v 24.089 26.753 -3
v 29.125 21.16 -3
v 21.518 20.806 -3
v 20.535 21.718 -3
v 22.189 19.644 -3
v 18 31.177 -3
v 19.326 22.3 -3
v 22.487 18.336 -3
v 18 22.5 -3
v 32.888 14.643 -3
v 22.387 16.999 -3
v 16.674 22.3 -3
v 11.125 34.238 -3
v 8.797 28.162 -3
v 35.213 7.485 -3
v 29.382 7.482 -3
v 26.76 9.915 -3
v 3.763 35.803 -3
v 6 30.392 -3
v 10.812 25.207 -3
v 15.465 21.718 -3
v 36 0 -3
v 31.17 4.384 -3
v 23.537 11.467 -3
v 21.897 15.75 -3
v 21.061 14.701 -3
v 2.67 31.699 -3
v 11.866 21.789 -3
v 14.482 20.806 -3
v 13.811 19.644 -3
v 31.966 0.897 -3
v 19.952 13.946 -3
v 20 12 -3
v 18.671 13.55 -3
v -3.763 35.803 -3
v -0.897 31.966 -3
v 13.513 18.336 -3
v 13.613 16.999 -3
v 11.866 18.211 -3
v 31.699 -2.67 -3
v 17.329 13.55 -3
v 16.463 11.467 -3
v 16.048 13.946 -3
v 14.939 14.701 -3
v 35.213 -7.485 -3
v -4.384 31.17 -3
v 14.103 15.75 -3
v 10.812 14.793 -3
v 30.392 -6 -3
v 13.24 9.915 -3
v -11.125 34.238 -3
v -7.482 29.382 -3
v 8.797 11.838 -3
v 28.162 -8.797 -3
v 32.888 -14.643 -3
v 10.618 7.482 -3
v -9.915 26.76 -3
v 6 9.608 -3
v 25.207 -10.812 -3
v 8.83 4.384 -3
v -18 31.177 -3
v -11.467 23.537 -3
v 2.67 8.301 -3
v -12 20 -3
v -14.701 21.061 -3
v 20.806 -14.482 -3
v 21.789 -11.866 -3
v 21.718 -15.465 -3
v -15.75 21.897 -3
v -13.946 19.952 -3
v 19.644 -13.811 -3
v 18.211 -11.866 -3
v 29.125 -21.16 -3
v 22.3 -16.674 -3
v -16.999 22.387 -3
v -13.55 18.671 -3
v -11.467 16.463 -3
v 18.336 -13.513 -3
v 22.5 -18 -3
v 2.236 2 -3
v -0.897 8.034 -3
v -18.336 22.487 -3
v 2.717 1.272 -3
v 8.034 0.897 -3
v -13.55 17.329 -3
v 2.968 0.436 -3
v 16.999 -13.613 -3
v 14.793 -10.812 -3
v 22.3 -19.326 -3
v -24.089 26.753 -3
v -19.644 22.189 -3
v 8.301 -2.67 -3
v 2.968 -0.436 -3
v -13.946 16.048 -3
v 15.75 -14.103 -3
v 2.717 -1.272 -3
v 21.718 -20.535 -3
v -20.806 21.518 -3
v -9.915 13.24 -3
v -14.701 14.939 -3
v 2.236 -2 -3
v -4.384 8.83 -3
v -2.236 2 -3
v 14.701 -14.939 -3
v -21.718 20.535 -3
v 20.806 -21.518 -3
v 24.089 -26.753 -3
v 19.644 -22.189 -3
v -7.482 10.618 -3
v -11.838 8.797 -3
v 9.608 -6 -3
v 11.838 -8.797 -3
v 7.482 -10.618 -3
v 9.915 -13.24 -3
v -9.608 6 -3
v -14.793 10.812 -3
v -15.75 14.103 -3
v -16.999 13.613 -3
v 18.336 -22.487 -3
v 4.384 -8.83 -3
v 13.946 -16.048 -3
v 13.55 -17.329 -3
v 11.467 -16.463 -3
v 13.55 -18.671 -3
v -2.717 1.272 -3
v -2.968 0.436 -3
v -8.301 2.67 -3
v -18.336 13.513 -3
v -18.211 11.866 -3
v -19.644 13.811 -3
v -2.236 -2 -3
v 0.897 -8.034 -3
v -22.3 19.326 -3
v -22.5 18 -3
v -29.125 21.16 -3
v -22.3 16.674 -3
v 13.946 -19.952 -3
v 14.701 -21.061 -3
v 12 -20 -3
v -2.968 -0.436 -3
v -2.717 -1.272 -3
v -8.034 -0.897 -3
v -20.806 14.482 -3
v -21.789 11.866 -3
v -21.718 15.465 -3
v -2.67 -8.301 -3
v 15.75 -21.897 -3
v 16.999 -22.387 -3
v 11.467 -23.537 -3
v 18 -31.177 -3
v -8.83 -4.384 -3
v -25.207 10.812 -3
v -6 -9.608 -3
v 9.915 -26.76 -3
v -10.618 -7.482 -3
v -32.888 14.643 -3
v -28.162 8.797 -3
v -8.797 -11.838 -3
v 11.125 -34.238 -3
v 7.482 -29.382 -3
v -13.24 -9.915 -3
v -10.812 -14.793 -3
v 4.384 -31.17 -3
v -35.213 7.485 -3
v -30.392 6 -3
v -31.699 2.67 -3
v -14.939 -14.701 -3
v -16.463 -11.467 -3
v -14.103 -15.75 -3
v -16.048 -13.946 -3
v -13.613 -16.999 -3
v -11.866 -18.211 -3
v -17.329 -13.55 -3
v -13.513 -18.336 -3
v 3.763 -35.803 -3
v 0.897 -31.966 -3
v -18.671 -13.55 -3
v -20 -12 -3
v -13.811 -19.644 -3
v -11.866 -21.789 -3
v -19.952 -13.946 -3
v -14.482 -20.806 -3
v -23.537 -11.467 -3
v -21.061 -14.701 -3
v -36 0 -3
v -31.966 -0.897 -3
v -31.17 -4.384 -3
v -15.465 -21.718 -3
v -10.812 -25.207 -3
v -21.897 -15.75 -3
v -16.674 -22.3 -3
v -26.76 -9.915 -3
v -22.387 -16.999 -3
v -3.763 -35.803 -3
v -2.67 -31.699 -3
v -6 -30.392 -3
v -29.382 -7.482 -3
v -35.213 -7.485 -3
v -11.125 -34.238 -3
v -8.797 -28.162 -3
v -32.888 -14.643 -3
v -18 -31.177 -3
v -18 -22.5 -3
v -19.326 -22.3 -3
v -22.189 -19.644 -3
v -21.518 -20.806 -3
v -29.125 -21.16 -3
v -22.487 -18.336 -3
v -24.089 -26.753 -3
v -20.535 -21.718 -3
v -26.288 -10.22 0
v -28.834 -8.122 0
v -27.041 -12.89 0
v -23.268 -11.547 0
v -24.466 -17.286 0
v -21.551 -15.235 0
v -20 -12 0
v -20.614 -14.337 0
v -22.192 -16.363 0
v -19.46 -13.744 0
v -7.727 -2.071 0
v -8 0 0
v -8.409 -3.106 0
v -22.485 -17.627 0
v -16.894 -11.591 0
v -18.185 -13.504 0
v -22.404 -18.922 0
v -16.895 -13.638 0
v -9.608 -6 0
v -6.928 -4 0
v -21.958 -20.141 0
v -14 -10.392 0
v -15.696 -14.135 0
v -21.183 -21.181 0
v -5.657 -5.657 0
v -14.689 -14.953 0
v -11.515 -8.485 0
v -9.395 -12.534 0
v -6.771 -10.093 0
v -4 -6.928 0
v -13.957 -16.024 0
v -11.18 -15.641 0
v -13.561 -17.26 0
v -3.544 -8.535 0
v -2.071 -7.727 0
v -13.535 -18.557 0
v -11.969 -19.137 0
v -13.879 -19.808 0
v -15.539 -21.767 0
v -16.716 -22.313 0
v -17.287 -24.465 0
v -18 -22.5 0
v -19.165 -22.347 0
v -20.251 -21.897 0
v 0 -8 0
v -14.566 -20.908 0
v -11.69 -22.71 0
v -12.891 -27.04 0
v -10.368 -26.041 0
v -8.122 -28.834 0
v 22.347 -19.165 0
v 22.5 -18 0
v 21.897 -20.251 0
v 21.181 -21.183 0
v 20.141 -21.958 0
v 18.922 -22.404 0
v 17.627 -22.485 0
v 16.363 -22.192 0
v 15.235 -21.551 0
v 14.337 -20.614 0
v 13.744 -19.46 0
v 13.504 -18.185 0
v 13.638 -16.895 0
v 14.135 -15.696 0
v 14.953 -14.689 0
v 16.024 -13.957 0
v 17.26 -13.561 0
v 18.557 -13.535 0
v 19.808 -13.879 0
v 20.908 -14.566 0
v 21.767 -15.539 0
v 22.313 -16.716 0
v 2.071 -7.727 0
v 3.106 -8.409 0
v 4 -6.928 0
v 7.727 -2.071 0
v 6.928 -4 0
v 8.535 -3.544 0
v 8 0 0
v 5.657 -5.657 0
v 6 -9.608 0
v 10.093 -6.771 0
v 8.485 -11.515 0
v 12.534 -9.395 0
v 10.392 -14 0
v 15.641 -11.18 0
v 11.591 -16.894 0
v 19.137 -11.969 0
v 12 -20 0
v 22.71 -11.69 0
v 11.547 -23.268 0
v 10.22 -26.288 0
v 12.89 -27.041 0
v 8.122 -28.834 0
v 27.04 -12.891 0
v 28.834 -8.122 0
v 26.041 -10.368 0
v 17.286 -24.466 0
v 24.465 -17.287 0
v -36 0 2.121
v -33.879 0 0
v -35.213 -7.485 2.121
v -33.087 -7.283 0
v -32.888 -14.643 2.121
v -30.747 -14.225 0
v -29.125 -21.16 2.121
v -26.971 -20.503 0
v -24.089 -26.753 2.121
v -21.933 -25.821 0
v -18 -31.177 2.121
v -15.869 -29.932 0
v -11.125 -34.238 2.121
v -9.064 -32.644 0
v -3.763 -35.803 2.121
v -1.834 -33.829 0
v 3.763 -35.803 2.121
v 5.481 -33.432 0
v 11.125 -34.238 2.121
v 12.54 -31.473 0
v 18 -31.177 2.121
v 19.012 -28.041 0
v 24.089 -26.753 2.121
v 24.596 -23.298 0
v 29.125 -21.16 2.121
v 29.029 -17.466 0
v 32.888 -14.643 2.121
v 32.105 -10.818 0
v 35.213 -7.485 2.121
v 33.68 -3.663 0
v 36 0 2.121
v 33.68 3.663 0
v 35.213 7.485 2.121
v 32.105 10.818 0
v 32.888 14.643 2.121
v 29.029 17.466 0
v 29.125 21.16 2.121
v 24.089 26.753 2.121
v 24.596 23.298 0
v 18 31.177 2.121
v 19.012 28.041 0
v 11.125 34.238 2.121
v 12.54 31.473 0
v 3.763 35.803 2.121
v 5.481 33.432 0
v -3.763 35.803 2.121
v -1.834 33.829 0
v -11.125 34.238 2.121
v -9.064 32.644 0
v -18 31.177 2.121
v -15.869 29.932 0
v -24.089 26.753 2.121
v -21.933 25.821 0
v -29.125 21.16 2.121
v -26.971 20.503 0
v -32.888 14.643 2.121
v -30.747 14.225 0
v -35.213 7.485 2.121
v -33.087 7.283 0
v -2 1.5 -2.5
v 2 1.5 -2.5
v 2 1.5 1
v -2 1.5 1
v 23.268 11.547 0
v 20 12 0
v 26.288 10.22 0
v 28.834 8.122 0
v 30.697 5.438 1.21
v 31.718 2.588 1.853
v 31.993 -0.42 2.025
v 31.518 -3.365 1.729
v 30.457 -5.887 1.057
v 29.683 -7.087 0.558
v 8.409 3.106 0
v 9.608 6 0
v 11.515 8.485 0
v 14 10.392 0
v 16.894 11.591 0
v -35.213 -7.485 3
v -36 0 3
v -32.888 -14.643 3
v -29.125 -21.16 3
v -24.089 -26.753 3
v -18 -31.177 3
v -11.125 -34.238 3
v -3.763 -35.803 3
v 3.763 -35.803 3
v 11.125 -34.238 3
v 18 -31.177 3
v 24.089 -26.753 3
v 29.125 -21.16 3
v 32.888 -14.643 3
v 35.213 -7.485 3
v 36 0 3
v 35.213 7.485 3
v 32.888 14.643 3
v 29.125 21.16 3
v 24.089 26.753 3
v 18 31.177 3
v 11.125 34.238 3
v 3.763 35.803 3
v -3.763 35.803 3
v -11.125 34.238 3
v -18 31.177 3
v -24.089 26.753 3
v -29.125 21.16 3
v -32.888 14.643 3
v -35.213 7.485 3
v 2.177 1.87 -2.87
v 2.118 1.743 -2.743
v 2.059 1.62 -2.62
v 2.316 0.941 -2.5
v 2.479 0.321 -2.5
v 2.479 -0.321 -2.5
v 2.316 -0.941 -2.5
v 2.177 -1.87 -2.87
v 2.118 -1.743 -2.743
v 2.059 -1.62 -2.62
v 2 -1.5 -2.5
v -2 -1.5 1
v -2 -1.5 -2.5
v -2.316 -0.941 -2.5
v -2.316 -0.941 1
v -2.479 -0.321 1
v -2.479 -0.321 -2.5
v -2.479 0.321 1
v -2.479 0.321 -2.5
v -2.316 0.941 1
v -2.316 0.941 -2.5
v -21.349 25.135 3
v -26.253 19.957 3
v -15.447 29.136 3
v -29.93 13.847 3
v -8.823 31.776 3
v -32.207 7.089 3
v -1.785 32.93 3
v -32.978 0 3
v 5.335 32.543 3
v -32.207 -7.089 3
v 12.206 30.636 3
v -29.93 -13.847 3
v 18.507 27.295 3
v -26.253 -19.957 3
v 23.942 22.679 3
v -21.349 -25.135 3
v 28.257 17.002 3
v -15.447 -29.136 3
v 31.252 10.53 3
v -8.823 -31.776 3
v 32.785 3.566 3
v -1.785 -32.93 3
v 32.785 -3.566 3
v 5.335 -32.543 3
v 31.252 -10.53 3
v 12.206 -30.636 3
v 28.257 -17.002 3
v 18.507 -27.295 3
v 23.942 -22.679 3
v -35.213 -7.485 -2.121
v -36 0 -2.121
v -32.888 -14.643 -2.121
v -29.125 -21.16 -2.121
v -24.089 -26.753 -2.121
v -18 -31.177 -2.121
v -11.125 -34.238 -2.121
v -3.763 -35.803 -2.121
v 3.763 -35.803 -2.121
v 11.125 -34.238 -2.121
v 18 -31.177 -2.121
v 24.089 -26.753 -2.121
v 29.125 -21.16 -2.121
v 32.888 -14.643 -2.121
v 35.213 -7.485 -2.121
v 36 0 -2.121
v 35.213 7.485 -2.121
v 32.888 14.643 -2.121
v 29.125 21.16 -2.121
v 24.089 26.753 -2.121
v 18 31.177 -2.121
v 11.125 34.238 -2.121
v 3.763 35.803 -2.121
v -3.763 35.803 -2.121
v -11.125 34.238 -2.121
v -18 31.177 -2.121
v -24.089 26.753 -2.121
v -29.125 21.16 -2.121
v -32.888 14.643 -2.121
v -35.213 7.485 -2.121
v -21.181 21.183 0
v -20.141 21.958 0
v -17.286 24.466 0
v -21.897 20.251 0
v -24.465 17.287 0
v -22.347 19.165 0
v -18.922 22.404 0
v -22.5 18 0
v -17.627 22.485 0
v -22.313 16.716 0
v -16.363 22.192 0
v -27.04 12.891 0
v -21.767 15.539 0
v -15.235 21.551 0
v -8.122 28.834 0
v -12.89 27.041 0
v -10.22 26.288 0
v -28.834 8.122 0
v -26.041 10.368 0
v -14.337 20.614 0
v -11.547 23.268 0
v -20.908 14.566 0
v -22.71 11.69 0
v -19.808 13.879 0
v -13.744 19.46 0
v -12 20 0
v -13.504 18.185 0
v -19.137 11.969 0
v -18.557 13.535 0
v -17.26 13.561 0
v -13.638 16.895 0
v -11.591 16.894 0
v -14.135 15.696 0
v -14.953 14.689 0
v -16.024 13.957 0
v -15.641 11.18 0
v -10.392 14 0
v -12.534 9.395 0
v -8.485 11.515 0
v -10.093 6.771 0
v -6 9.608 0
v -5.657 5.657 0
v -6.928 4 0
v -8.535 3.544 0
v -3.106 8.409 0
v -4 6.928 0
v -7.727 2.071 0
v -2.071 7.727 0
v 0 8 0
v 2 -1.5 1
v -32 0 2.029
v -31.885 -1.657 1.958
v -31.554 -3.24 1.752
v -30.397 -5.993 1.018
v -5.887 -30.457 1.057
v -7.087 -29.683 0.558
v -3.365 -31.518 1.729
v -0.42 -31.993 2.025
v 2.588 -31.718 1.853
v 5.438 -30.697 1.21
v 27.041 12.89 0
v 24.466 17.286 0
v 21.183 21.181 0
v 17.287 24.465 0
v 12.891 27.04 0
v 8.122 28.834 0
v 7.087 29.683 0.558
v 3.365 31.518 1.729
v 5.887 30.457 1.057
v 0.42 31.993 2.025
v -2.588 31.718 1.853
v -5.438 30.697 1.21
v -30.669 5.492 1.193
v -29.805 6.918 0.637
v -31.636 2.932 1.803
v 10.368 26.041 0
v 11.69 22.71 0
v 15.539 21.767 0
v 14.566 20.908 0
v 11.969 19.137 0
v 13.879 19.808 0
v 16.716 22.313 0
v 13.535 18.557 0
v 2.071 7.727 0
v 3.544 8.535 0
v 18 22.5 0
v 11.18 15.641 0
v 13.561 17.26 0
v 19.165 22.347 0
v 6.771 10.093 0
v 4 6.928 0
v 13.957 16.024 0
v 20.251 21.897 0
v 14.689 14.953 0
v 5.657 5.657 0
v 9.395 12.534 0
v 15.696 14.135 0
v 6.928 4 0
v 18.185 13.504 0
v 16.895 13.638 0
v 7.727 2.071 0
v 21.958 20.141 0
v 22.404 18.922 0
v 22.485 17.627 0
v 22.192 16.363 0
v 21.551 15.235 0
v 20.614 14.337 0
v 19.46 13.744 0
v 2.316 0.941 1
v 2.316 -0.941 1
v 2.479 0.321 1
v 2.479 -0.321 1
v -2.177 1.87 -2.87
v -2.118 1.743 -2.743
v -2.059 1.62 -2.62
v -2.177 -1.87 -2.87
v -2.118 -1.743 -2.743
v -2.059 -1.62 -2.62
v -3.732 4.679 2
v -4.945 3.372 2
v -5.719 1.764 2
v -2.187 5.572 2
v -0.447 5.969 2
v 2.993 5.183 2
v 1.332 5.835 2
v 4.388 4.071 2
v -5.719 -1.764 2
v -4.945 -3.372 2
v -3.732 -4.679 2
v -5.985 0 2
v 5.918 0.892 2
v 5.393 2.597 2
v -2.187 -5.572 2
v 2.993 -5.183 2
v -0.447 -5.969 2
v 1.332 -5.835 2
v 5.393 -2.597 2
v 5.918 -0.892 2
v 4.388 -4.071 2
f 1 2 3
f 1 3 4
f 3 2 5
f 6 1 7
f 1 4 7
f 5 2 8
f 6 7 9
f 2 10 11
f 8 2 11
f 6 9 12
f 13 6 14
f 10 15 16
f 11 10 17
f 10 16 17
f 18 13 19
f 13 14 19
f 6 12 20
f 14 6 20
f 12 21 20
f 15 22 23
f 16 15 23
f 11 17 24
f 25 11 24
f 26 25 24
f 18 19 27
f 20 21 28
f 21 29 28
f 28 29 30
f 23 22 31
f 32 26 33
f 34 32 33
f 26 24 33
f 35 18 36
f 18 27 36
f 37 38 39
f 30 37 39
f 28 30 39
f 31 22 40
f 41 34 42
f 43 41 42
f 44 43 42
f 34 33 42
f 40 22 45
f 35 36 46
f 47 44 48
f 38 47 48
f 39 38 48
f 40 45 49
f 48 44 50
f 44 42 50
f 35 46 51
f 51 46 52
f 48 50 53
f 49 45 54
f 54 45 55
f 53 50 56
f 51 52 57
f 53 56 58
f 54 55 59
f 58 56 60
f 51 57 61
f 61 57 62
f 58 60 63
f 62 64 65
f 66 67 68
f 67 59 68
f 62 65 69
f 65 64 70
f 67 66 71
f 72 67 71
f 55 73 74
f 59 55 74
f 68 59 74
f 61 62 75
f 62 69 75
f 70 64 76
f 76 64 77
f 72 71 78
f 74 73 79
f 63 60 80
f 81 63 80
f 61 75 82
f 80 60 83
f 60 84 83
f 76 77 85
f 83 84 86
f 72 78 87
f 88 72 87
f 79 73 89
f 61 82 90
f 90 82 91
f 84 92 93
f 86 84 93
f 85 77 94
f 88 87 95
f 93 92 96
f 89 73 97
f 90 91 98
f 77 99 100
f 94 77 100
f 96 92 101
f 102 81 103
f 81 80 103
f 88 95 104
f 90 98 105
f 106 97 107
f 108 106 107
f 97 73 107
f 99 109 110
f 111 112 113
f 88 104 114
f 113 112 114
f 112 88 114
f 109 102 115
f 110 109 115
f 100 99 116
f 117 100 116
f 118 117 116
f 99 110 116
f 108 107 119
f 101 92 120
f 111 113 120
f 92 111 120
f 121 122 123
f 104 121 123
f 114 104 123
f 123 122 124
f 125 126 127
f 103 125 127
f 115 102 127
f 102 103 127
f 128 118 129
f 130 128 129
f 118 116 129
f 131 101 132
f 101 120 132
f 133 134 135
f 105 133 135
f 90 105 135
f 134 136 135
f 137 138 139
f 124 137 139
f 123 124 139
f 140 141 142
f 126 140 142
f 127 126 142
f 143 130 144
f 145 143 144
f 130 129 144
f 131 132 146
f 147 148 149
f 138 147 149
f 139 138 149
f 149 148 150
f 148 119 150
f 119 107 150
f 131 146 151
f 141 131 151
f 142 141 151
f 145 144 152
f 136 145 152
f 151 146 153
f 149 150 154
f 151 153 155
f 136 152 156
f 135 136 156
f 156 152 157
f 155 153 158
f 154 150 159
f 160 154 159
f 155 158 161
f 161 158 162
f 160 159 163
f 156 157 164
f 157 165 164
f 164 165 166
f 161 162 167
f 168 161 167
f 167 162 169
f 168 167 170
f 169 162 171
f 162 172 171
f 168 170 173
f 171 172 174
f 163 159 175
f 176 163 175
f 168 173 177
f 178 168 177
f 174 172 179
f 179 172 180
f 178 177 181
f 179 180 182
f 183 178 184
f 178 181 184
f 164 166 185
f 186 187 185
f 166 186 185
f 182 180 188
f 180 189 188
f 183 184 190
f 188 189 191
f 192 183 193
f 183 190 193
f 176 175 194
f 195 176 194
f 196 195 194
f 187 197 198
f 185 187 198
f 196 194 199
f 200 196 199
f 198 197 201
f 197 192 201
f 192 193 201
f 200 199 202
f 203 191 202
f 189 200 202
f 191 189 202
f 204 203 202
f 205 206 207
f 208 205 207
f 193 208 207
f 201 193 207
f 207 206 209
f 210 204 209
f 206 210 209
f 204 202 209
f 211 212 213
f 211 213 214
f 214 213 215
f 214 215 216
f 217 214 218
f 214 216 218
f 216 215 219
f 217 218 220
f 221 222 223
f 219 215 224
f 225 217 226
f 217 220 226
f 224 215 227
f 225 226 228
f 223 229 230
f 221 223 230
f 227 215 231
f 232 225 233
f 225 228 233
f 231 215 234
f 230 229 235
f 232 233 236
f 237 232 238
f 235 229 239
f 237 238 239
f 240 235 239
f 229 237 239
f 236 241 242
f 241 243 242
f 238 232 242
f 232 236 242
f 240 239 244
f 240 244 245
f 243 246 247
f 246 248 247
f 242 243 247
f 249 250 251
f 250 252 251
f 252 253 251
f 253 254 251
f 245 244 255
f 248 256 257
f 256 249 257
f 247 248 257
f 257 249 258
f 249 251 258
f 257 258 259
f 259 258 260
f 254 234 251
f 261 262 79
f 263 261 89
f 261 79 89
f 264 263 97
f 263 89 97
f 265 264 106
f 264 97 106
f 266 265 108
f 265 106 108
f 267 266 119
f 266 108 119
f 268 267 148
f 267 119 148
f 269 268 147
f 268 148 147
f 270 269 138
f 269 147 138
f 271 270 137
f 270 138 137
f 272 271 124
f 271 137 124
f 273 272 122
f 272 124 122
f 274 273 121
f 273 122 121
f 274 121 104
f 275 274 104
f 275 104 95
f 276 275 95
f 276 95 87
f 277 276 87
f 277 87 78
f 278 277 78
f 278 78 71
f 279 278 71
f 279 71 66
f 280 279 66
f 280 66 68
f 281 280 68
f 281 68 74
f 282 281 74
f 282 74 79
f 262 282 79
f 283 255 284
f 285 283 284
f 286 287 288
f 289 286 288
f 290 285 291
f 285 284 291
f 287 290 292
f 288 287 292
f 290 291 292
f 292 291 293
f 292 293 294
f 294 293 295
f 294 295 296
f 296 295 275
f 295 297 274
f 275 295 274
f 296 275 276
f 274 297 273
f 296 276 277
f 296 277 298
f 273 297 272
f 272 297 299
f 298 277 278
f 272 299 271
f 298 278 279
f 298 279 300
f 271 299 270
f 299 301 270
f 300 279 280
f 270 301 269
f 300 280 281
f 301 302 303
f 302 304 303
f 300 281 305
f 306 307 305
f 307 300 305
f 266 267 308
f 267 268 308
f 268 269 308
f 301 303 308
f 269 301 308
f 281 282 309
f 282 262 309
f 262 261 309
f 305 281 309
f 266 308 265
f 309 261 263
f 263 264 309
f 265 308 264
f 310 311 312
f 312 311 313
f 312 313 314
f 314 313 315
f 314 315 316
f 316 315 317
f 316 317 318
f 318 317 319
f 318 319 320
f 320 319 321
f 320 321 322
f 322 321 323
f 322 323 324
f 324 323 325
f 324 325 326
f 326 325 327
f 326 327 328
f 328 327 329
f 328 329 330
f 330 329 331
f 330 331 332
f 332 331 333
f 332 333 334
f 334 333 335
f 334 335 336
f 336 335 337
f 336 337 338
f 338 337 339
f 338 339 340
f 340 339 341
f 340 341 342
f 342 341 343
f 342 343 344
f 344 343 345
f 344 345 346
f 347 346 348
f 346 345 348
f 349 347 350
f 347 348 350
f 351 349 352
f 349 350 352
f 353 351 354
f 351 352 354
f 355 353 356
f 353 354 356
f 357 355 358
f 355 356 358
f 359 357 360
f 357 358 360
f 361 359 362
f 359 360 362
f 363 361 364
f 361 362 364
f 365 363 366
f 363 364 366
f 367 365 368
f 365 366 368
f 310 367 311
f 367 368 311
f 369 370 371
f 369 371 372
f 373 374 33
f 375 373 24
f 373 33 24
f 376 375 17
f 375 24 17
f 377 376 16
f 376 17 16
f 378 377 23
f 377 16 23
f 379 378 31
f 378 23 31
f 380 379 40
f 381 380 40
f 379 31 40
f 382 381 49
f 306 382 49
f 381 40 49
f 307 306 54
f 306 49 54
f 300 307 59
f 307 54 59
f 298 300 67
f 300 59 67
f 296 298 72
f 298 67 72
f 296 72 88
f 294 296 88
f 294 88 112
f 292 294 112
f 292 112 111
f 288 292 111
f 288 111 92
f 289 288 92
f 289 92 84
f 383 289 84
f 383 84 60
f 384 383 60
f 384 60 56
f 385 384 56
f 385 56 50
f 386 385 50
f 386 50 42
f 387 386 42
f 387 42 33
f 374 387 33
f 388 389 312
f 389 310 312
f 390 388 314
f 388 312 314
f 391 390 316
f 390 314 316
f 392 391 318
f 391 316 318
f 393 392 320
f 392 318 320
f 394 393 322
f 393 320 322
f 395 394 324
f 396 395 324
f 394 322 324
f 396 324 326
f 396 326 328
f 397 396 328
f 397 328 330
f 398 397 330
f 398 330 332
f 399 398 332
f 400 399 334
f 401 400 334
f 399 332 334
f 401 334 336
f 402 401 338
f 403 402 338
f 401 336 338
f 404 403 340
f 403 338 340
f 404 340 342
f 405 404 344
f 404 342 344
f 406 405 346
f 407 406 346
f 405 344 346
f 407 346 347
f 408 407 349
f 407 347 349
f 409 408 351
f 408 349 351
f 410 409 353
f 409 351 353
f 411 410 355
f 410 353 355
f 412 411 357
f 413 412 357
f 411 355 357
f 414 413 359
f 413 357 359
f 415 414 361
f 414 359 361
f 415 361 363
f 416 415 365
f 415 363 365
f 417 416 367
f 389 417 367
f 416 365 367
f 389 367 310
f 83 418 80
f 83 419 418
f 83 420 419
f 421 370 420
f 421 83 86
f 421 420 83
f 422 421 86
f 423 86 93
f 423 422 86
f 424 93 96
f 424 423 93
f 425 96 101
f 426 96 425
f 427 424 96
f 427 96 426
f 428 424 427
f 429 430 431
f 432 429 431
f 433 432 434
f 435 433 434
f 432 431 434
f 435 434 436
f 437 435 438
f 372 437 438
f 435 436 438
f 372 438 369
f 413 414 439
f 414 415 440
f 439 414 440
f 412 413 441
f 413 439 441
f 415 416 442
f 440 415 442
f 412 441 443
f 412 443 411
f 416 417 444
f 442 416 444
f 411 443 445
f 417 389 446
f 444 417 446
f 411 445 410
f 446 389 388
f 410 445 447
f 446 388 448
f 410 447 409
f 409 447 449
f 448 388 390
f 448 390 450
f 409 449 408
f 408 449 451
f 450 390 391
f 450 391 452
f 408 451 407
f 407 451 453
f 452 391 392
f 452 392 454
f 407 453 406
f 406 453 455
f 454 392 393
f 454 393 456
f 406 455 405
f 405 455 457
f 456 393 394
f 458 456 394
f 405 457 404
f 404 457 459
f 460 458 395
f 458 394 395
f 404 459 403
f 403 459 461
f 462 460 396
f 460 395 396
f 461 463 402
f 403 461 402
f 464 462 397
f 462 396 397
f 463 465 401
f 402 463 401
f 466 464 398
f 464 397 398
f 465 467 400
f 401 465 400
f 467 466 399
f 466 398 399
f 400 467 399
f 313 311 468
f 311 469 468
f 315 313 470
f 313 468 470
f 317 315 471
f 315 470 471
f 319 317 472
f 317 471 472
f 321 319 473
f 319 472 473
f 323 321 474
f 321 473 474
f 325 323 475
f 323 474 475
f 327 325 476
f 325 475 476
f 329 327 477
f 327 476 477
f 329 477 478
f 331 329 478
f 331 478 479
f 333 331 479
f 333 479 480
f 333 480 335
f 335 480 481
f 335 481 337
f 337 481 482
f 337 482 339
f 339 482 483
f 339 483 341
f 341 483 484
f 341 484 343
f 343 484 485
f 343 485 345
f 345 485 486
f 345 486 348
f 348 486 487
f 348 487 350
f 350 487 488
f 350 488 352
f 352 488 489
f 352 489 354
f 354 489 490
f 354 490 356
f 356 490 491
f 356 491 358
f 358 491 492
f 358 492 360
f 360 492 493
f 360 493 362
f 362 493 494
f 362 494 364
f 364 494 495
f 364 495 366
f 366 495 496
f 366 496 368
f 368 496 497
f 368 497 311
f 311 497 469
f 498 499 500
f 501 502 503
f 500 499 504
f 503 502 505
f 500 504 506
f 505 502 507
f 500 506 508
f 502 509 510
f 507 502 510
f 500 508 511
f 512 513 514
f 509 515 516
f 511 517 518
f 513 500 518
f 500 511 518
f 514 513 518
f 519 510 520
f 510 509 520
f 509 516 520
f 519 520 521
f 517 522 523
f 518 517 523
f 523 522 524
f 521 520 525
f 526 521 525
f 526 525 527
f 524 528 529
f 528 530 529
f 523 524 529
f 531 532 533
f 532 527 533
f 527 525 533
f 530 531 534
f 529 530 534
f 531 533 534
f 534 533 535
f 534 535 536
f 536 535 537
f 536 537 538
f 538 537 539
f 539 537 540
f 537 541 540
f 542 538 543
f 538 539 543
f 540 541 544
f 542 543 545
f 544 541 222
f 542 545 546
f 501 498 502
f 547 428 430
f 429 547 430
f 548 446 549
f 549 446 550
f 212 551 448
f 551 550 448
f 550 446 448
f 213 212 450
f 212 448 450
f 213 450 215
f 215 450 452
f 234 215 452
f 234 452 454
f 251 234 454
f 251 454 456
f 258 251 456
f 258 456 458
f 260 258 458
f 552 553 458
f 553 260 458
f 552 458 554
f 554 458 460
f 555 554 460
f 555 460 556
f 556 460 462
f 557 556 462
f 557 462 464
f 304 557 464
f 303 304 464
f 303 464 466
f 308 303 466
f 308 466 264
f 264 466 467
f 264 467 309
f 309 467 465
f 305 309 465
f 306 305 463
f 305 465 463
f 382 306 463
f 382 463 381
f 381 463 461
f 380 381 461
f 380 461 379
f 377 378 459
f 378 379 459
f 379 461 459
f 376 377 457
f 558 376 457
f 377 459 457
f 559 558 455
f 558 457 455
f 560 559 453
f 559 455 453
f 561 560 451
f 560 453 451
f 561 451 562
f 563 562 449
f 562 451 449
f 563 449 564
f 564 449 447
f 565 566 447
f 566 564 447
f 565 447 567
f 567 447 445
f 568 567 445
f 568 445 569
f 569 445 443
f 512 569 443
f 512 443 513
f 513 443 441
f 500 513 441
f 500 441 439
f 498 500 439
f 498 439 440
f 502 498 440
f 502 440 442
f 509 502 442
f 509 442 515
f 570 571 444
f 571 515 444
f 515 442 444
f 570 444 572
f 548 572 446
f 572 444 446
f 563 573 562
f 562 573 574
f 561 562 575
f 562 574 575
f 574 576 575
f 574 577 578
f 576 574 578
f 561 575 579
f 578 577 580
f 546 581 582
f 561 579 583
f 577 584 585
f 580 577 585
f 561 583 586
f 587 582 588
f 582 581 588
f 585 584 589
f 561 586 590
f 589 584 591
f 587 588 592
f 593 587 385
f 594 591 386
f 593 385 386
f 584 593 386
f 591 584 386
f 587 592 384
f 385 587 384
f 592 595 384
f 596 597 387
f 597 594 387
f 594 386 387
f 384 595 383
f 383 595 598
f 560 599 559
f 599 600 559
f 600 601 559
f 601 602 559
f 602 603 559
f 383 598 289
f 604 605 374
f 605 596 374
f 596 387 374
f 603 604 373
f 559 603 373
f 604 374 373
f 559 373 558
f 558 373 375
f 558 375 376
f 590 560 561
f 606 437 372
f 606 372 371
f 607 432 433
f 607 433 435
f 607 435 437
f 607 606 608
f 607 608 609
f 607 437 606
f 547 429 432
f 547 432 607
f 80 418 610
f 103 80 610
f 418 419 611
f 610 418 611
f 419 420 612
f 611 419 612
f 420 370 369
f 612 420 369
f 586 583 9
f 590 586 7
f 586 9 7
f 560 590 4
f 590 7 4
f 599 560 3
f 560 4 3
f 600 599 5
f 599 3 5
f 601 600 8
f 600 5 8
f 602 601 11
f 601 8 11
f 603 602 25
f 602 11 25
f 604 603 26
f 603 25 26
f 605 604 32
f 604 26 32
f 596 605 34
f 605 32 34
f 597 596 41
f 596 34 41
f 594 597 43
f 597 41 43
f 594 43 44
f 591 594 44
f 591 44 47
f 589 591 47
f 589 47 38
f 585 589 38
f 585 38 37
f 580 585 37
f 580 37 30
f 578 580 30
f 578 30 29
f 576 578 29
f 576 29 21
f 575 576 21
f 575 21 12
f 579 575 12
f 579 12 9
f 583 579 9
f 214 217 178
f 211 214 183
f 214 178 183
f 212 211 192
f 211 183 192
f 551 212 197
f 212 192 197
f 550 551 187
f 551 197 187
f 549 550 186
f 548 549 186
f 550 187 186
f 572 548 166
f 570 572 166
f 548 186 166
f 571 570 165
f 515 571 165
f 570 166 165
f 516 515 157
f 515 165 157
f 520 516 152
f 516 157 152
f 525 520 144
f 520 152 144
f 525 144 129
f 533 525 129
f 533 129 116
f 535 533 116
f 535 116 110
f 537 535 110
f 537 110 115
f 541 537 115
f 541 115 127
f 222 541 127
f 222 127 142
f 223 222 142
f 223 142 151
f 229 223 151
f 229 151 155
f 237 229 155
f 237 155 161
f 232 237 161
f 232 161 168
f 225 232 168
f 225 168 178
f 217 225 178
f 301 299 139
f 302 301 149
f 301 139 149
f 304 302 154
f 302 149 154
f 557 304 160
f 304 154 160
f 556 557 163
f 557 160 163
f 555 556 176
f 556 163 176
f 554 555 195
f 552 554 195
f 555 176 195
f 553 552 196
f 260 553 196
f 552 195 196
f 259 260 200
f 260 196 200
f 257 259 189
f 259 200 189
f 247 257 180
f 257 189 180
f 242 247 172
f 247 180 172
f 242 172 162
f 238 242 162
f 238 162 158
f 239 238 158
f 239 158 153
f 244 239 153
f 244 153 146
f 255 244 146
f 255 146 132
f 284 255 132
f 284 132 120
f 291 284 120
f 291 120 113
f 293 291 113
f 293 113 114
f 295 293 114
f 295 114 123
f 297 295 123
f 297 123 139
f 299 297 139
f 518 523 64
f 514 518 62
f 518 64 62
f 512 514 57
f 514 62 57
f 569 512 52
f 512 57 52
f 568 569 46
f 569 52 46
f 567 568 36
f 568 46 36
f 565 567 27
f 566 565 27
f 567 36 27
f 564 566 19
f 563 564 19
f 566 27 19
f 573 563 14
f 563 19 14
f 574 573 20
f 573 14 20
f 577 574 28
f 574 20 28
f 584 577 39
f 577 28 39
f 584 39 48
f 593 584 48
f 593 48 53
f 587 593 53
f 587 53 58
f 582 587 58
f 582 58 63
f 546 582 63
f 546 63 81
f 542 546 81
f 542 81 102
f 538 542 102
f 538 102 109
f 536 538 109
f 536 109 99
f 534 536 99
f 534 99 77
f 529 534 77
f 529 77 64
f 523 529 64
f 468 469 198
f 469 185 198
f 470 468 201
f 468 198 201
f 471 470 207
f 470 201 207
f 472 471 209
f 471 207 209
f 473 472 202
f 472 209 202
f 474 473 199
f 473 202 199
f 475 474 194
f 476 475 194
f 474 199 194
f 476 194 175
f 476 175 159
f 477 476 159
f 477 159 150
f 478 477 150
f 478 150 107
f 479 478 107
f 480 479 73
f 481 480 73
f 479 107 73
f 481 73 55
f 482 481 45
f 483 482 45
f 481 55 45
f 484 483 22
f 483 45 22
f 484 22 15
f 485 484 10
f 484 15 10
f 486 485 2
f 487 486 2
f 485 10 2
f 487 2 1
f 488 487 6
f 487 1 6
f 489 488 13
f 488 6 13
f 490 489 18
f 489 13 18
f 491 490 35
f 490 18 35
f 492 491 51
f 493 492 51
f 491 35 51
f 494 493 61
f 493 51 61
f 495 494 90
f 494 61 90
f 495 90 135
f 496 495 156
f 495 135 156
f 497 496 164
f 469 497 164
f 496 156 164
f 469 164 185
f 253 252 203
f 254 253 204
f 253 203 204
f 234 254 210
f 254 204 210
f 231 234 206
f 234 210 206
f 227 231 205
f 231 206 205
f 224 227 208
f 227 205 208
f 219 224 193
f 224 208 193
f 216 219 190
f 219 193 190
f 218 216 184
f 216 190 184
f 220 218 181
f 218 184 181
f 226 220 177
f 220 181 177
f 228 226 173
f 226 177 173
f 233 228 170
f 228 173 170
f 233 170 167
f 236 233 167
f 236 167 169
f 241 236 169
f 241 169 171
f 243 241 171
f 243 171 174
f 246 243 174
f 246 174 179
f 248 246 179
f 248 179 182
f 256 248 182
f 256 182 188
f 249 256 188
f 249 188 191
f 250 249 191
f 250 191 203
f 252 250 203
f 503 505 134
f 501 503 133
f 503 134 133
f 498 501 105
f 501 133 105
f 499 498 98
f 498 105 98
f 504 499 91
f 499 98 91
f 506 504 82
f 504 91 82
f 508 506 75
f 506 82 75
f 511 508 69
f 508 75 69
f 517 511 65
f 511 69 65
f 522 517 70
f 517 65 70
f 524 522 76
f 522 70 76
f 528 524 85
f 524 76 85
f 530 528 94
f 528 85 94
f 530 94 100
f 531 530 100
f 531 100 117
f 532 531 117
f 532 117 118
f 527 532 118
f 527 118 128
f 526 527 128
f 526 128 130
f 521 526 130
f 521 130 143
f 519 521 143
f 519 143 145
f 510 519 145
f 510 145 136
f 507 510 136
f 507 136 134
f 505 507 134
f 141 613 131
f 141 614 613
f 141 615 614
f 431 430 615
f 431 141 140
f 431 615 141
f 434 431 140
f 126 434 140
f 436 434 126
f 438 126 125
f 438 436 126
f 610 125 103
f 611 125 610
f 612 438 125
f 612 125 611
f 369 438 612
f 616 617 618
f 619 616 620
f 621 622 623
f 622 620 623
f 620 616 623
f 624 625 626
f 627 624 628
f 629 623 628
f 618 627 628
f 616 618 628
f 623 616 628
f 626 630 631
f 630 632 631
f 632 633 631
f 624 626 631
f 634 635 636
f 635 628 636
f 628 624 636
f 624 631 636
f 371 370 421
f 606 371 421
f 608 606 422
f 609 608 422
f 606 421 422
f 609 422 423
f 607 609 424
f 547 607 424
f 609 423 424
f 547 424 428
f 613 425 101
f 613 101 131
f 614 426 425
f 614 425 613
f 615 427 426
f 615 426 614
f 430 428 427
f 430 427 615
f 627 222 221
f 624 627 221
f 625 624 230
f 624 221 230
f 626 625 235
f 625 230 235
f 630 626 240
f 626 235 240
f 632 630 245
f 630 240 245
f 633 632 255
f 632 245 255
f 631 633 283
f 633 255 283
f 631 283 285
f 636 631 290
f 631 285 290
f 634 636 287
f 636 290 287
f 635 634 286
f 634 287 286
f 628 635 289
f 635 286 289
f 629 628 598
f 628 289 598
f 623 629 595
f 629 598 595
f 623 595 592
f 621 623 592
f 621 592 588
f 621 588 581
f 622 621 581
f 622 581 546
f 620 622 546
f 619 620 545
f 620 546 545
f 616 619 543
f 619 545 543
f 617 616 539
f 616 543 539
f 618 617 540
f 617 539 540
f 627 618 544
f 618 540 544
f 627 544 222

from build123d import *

# Parameters (mm, degrees)
SKETCH001_R        = 12
SKETCH001_R_2      = 4.5
POCKET_DEPTH       = 210.001
POLARPATTERN_COUNT = 4
POCKET001_DEPTH    = 4
CHAMFER_SIZE       = 0.5


with BuildPart() as part:
    # Sketch → Revolution (revolve)
    with BuildSketch(Plane.XZ):
        Polygon((0, 2), (-5.985281, 2), (-8, 0), (-29.955844, 0), (-32.977922, 3), (-36, 3), (-36, 2.12132), (-33.87868, 0), (-36, -2.12132), (-36, -3), (0, -3), align=None)
    revolve(axis=Axis((0, 0, 0), (0, 0, 1)))

    # Sketch001 → Pocket (cut, through all)
    with BuildSketch(Plane(origin=(0, 0, -3), x_dir=(1, 0, 0), z_dir=(0, 0, -1))):
        with Locations((0, 20)):
            Circle(SKETCH001_R)
        with Locations((18, 18)):
            Circle(SKETCH001_R_2)
    pocket = extrude(amount=-POCKET_DEPTH, mode=Mode.SUBTRACT)

    # PolarPattern: Pocket ×4 about axis
    polarpattern_axis = Axis((0, 0, -3), (0, 0, -1))
    for i in range(1, POLARPATTERN_COUNT):
        add(pocket.rotate(polarpattern_axis, i * 360 / POLARPATTERN_COUNT), mode=Mode.SUBTRACT)

    # Sketch002 → Pocket001 (cut)
    with BuildSketch(Plane(origin=(0, 0, -3), x_dir=(1, 0, 0), z_dir=(0, 0, -1))):
        with BuildLine():
            ThreePointArc((-2, 1.5), (-2.5, 0), (-2, -1.5))
            Line((2, -1.5), (-2, -1.5))
            ThreePointArc((2, -1.5), (2.5, 0), (2, 1.5))
            Line((2, 1.5), (-2, 1.5))
        make_face()
    extrude(amount=-POCKET001_DEPTH, mode=Mode.SUBTRACT)

    # Chamfer
    chamfer_edges = [part.edges().sort_by_distance(p)[0] for p in [
        (0, -1.5, -3),
        (-2.5, 0, -3),
        (0, 1.5, -3),
        (2.5, 0, -3),
    ]]
    chamfer(chamfer_edges, length=CHAMFER_SIZE)


solid = part.part
